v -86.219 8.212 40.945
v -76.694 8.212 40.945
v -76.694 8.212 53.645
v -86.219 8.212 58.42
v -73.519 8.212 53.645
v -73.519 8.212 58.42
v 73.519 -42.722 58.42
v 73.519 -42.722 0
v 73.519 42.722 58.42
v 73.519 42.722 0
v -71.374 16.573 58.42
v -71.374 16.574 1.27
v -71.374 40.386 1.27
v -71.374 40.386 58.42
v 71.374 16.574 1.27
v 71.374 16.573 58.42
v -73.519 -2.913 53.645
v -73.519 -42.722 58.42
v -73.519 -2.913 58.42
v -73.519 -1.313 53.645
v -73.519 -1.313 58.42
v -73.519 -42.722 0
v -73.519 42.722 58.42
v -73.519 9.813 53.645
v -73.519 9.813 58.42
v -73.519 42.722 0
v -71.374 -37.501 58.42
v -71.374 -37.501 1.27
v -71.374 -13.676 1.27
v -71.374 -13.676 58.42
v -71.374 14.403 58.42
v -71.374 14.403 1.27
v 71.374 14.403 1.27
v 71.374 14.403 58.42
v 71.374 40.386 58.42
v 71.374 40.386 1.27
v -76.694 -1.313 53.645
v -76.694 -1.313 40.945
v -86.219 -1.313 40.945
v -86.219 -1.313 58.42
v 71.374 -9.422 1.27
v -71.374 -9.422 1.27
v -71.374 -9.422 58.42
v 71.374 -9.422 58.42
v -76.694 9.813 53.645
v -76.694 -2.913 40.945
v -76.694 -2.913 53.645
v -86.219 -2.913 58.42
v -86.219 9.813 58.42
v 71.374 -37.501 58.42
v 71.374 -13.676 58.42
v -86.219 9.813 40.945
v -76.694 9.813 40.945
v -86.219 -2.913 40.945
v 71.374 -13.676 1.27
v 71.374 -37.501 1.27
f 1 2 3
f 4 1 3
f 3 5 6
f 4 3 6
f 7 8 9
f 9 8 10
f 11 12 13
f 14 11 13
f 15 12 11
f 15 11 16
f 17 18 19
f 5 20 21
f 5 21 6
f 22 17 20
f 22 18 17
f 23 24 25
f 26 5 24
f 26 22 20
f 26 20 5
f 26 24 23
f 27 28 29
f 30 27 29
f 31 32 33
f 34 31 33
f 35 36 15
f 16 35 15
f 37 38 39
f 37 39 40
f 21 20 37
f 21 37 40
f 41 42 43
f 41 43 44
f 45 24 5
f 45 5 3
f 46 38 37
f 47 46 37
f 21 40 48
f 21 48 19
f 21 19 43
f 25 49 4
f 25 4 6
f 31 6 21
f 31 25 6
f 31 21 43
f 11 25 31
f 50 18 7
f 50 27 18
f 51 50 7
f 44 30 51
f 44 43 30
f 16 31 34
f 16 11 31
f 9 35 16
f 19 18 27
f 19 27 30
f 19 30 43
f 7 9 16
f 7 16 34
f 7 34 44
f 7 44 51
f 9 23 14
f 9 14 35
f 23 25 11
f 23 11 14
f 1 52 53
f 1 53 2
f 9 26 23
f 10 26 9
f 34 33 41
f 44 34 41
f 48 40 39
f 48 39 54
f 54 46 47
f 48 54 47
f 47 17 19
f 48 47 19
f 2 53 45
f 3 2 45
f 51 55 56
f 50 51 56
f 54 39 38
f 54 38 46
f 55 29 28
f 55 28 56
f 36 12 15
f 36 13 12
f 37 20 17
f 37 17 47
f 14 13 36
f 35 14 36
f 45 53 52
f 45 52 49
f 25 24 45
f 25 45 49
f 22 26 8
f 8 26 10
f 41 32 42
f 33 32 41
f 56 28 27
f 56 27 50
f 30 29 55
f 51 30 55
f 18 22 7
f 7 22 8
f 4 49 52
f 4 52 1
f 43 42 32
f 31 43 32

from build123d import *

# Parameters (mm, degrees)
F0_W     = 147.0372378826
F0_H     = 85.4446366429
F0_W_2   = 142.748
F0_H_2   = 2.1700232911
F0_H_3   = 4.2537826065
F0_H_4   = 2.8852941023
F1_DEPTH = 58.42
F0_H_5   = 23.8125
F0_H_6   = 23.8252
F2_DEPTH = 1.27
F3_W     = 1.6002
F3_H     = 17.4752
F4_DEPTH = 12.7
F5_W     = 3.175
F5_H     = 12.7
F6_DEPTH = 25.4


with BuildPart() as f1:
    # F0 (on Top) → F1 (new body)
    with BuildSketch(Plane.XY):
        Rectangle(F0_W, F0_H)
        Polygon((71.374, -37.5007058977), (71.374, -40.386), (-71.374, -40.386), (-71.374, -37.5007058977), (-71.374, -13.6755058977), (-71.374, -9.4217232911), (-71.374, 14.4034767089), (-71.374, 16.5735), (-71.374, 40.386), (71.374, 40.386), (71.374, 16.5735), (71.374, 14.4034767089), (71.374, -9.4217232911), (71.374, -13.6755058977), align=None, mode=Mode.SUBTRACT)
        with Locations((0, 15.4884883544)):
            Rectangle(F0_W_2, F0_H_2)
        with Locations((0, -11.5486145944)):
            Rectangle(F0_W_2, F0_H_3)
        with Locations((0, -38.9433529488)):
            Rectangle(F0_W_2, F0_H_4)
    extrude(amount=F1_DEPTH)

    # F0 (on Top) → F2 (join)
    with BuildSketch(Plane.XY):
        Rectangle(F0_W, F0_H)
        Polygon((71.374, -37.5007058977), (71.374, -40.386), (-71.374, -40.386), (-71.374, -37.5007058977), (-71.374, -13.6755058977), (-71.374, -9.4217232911), (-71.374, 14.4034767089), (-71.374, 16.5735), (-71.374, 40.386), (71.374, 40.386), (71.374, 16.5735), (71.374, 14.4034767089), (71.374, -9.4217232911), (71.374, -13.6755058977), align=None, mode=Mode.SUBTRACT)
        with Locations((0, 28.47975)):
            Rectangle(F0_W_2, F0_H_5)
        with Locations((0, 2.4908767089)):
            Rectangle(F0_W_2, F0_H_6)
        with Locations((0, -25.5881058977)):
            Rectangle(F0_W_2, F0_H_6)
    extrude(amount=F2_DEPTH)

    # F3 (on face) → F4 (join)
    with BuildSketch(Plane(origin=(-73.5186189413, 0, 0), x_dir=(0, -1, 0), z_dir=(-1, 0, 0))):
        with Locations((-9.0124478253, 49.6824)):
            Rectangle(F3_W, F3_H)
        with Locations((2.1127521747, 49.6824)):
            Rectangle(F3_W, F3_H)
    extrude(amount=F4_DEPTH)

    # F5 (on face) → F6 (cut)
    with BuildSketch(Plane(origin=(0, 9.8125478253, 0), x_dir=(-1, 0, 0), z_dir=(0, 1, 0))):
        with Locations((75.1061189413, 47.2948)):
            Rectangle(F5_W, F5_H)
    extrude(amount=-F6_DEPTH, mode=Mode.SUBTRACT)


solid = f1.part
